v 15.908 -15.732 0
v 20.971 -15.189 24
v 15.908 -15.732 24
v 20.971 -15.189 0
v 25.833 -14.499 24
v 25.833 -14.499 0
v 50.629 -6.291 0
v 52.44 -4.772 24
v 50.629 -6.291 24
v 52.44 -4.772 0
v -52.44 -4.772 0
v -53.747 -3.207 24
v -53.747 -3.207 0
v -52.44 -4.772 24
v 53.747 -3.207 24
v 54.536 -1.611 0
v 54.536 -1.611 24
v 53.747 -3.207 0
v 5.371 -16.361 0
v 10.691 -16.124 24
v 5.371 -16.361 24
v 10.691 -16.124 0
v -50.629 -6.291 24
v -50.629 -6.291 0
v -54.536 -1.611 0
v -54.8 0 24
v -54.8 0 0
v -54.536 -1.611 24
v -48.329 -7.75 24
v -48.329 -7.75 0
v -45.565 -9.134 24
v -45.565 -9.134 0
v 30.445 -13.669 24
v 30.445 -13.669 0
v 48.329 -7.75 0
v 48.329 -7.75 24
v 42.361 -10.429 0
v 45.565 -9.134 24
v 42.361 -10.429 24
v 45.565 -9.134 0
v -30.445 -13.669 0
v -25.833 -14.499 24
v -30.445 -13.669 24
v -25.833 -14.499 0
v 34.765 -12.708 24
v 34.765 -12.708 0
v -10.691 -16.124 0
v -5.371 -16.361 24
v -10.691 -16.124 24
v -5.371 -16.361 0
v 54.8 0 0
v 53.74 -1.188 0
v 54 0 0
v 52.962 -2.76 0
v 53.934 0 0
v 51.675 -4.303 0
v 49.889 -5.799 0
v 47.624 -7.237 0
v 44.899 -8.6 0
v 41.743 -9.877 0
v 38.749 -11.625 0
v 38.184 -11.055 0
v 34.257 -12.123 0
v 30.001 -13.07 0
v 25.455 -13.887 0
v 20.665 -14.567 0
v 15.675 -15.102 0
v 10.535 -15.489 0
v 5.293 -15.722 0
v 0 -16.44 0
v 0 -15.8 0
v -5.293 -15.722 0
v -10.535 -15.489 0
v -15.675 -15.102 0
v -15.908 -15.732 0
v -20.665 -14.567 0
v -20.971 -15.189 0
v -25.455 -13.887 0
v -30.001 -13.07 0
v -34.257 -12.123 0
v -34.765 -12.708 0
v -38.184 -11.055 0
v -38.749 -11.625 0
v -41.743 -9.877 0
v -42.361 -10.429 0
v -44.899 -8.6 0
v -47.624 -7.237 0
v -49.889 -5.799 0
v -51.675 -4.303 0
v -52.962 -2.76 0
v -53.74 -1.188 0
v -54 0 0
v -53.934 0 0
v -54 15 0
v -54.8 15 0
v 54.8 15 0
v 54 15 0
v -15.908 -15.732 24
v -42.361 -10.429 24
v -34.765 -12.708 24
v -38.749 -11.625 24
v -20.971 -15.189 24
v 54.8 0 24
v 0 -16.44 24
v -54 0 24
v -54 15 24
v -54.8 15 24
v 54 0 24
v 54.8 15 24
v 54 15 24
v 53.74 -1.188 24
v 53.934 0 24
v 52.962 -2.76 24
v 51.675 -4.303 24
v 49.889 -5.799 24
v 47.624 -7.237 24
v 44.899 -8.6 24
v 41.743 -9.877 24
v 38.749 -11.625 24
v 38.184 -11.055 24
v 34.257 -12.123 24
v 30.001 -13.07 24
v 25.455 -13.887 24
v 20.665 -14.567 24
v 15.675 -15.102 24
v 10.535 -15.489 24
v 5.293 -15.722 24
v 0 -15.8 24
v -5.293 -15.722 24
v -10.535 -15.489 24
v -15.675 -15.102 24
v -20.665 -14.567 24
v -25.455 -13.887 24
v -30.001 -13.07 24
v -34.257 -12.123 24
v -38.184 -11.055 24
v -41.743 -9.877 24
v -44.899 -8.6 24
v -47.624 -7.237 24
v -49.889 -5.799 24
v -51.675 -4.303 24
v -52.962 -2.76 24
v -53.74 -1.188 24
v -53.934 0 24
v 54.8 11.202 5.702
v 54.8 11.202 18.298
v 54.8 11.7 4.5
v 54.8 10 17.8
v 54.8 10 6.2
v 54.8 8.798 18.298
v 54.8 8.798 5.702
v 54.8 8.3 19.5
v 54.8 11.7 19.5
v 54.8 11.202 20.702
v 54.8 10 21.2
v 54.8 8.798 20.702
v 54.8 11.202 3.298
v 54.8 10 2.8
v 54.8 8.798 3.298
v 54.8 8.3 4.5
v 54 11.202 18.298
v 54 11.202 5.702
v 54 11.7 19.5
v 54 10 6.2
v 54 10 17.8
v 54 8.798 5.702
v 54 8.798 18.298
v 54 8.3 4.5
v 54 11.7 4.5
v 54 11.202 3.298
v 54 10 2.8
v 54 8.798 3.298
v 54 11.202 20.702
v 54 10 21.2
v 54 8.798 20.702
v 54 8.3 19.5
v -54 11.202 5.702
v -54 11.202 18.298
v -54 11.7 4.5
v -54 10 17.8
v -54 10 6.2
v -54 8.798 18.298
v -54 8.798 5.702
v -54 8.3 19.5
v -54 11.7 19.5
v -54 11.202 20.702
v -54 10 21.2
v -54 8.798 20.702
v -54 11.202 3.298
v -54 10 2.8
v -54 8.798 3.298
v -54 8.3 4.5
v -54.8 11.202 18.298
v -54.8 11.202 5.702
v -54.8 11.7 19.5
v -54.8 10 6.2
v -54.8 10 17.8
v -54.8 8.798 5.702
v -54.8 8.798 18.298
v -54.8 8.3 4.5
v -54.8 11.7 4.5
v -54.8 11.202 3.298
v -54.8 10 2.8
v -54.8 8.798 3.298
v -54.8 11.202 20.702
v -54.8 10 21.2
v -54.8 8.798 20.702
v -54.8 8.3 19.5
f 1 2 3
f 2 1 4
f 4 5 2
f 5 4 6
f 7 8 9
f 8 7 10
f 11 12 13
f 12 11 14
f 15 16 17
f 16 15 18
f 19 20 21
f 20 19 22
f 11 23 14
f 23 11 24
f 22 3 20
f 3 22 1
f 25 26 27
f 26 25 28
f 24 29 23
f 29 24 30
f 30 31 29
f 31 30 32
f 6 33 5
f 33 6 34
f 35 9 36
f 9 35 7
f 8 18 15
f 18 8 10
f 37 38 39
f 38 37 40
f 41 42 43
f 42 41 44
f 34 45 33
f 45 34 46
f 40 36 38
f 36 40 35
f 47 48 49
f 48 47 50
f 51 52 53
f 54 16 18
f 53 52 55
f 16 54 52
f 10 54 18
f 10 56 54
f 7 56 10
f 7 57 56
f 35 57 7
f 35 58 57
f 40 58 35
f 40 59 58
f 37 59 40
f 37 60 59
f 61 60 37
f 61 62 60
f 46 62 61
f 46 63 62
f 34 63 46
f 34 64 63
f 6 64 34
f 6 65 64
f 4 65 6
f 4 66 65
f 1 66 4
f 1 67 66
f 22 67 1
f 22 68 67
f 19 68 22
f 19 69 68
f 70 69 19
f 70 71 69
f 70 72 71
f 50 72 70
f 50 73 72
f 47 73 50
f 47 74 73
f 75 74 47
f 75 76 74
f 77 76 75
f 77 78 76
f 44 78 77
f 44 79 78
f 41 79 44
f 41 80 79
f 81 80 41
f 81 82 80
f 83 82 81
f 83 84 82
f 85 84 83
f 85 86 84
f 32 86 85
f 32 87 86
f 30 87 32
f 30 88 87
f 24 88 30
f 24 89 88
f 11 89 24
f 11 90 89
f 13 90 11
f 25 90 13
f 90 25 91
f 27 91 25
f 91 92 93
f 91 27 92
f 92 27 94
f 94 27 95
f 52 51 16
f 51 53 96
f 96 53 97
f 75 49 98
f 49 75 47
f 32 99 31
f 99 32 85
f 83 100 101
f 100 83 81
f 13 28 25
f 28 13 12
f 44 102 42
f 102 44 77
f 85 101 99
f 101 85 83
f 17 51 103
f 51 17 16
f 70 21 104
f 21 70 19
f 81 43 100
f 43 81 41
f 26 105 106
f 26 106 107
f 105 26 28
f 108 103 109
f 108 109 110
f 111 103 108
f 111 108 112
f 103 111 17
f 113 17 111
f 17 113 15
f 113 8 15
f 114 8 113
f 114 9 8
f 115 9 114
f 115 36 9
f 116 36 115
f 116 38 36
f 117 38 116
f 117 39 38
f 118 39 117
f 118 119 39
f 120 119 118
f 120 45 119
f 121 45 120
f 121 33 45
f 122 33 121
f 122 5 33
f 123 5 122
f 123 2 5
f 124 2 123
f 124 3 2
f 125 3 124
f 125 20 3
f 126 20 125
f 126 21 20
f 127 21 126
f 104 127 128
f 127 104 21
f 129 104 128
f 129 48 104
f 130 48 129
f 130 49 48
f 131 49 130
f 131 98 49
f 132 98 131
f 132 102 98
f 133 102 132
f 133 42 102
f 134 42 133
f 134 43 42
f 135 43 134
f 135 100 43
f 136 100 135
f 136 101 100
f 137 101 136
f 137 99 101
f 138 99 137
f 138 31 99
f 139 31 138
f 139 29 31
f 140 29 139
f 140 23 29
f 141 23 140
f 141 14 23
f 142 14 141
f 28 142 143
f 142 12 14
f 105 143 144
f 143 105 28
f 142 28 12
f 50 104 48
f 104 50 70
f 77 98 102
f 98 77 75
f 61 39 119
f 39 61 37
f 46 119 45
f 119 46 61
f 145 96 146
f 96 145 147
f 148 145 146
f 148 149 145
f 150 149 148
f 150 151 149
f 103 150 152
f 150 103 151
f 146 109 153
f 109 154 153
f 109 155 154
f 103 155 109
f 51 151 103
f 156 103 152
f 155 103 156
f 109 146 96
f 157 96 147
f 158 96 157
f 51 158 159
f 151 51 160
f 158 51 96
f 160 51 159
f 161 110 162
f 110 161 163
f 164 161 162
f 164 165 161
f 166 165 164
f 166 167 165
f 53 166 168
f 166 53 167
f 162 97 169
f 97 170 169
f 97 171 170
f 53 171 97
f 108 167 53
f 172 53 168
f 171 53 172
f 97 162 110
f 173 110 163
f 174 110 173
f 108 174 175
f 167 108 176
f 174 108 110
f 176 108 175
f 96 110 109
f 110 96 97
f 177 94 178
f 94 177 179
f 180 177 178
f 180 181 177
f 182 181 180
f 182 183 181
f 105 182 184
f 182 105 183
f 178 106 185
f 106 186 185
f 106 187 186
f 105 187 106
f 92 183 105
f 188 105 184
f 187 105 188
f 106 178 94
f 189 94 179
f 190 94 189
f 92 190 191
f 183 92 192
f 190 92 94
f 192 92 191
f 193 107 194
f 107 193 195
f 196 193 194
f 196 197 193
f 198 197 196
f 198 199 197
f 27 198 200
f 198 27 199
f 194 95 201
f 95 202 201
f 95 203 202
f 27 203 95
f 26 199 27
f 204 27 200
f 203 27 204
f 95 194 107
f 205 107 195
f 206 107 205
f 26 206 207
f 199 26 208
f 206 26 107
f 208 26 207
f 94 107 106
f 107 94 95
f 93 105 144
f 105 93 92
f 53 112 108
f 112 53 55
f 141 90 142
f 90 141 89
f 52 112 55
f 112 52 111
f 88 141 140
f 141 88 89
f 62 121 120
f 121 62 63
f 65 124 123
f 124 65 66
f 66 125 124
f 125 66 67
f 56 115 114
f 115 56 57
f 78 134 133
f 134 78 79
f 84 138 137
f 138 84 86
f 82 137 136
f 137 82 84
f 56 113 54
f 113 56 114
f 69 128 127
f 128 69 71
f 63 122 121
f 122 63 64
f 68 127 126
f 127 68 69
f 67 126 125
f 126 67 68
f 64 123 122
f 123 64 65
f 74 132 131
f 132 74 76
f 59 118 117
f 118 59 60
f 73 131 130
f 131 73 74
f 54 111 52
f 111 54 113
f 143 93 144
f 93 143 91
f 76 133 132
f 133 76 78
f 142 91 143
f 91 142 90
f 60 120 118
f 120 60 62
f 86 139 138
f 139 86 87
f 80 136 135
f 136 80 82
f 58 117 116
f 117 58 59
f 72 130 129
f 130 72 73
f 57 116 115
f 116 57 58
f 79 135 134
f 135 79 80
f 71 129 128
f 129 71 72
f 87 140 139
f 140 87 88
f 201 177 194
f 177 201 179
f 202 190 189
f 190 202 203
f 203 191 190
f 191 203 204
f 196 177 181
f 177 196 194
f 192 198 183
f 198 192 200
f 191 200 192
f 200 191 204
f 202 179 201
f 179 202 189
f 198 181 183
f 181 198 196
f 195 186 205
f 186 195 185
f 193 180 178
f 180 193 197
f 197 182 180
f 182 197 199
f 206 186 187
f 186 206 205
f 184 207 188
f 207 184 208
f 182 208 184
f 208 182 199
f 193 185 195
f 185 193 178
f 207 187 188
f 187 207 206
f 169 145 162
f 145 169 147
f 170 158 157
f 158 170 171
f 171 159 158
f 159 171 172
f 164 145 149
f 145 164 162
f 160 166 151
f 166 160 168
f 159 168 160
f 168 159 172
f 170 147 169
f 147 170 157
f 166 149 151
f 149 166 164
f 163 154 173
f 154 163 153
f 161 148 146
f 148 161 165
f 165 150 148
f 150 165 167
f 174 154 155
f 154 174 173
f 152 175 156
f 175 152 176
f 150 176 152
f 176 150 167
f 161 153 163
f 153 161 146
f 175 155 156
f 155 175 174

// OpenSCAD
// B_ROBOT
// Arduino 3D printed Self Balancig Robot project
// Author: Jose Julio

// Robot Body shell

LENGTH = 108;
WIDTH = 36;
WIDTH2 = 24;

module base()
{
	//translate([-LENGTH/2,0,0]) cube([LENGTH,WIDTH,1]);
	
	translate([0,0,WIDTH/2]) scale([1,0.30]) cylinder(r=LENGTH/2+0.8,h=WIDTH,$fn=30,center=true);
	translate([LENGTH/2,0,0]) cube([0.8,15,WIDTH]);
	translate([-LENGTH/2-0.8,0,0]) cube([0.8,15,WIDTH]);

	
}

module holes()
{
	translate([-LENGTH/2,0,-1]) cube([LENGTH,WIDTH,WIDTH+2]);
	translate([0,0.4,WIDTH/2]) scale([1,0.3]) cylinder(r=LENGTH/2,h=WIDTH+10,$fn=64,center=true);
	translate([-LENGTH/2,10,(WIDTH-31)/2]) rotate([0,90,0]) cylinder(r=1.7,h=10,center=true,$fn=8);
	translate([-LENGTH/2,10,(WIDTH-31)/2+31]) rotate([0,90,0]) cylinder(r=1.7,h=10,center=true,$fn=8);
	translate([LENGTH/2,10,(WIDTH-31)/2]) rotate([0,90,0]) cylinder(r=1.7,h=10,center=true,$fn=8);
	translate([LENGTH/2,10,(WIDTH-31)/2+31]) rotate([0,90,0]) cylinder(r=1.7,h=10,center=true,$fn=8);

	translate([-LENGTH/2,15,WIDTH/2]) rotate([0,90,0]) scale([1,1]) cylinder(r=10,h=10,center=true,$fn=12);
	translate([LENGTH/2,15,WIDTH/2])  rotate([0,90,0]) scale([1,1]) cylinder(r=10,h=10,center=true,$fn=12);
}

module base2()
{
	//translate([-LENGTH/2,0,0]) cube([LENGTH,WIDTH2,1]);
	
	translate([0,0,WIDTH2/2]) scale([1,0.30]) cylinder(r=LENGTH/2+0.8,h=WIDTH2,$fn=64,center=true);
	translate([LENGTH/2,0,0]) cube([0.8,15,WIDTH2]);
	translate([-LENGTH/2-0.8,0,0]) cube([0.8,15,WIDTH2]);

	
}

module holes2()
{
	translate([-LENGTH/2,0,-1]) cube([LENGTH,WIDTH2,WIDTH2+2]);
	translate([0,0.4,WIDTH2/2]) scale([1,0.3]) cylinder(r=LENGTH/2,h=WIDTH2+10,$fn=64,center=true);
	translate([-LENGTH/2,10,(WIDTH2-15)/2]) rotate([0,90,0]) cylinder(r=1.7,h=10,center=true,$fn=8);
	translate([-LENGTH/2,10,(WIDTH2-15)/2+15]) rotate([0,90,0]) cylinder(r=1.7,h=10,center=true,$fn=8);
	translate([LENGTH/2,10,(WIDTH2-15)/2]) rotate([0,90,0]) cylinder(r=1.7,h=10,center=true,$fn=8);
	translate([LENGTH/2,10,(WIDTH2-15)/2+15]) rotate([0,90,0]) cylinder(r=1.7,h=10,center=true,$fn=8);

}

difference()
{
	base2();
	holes2();
}
